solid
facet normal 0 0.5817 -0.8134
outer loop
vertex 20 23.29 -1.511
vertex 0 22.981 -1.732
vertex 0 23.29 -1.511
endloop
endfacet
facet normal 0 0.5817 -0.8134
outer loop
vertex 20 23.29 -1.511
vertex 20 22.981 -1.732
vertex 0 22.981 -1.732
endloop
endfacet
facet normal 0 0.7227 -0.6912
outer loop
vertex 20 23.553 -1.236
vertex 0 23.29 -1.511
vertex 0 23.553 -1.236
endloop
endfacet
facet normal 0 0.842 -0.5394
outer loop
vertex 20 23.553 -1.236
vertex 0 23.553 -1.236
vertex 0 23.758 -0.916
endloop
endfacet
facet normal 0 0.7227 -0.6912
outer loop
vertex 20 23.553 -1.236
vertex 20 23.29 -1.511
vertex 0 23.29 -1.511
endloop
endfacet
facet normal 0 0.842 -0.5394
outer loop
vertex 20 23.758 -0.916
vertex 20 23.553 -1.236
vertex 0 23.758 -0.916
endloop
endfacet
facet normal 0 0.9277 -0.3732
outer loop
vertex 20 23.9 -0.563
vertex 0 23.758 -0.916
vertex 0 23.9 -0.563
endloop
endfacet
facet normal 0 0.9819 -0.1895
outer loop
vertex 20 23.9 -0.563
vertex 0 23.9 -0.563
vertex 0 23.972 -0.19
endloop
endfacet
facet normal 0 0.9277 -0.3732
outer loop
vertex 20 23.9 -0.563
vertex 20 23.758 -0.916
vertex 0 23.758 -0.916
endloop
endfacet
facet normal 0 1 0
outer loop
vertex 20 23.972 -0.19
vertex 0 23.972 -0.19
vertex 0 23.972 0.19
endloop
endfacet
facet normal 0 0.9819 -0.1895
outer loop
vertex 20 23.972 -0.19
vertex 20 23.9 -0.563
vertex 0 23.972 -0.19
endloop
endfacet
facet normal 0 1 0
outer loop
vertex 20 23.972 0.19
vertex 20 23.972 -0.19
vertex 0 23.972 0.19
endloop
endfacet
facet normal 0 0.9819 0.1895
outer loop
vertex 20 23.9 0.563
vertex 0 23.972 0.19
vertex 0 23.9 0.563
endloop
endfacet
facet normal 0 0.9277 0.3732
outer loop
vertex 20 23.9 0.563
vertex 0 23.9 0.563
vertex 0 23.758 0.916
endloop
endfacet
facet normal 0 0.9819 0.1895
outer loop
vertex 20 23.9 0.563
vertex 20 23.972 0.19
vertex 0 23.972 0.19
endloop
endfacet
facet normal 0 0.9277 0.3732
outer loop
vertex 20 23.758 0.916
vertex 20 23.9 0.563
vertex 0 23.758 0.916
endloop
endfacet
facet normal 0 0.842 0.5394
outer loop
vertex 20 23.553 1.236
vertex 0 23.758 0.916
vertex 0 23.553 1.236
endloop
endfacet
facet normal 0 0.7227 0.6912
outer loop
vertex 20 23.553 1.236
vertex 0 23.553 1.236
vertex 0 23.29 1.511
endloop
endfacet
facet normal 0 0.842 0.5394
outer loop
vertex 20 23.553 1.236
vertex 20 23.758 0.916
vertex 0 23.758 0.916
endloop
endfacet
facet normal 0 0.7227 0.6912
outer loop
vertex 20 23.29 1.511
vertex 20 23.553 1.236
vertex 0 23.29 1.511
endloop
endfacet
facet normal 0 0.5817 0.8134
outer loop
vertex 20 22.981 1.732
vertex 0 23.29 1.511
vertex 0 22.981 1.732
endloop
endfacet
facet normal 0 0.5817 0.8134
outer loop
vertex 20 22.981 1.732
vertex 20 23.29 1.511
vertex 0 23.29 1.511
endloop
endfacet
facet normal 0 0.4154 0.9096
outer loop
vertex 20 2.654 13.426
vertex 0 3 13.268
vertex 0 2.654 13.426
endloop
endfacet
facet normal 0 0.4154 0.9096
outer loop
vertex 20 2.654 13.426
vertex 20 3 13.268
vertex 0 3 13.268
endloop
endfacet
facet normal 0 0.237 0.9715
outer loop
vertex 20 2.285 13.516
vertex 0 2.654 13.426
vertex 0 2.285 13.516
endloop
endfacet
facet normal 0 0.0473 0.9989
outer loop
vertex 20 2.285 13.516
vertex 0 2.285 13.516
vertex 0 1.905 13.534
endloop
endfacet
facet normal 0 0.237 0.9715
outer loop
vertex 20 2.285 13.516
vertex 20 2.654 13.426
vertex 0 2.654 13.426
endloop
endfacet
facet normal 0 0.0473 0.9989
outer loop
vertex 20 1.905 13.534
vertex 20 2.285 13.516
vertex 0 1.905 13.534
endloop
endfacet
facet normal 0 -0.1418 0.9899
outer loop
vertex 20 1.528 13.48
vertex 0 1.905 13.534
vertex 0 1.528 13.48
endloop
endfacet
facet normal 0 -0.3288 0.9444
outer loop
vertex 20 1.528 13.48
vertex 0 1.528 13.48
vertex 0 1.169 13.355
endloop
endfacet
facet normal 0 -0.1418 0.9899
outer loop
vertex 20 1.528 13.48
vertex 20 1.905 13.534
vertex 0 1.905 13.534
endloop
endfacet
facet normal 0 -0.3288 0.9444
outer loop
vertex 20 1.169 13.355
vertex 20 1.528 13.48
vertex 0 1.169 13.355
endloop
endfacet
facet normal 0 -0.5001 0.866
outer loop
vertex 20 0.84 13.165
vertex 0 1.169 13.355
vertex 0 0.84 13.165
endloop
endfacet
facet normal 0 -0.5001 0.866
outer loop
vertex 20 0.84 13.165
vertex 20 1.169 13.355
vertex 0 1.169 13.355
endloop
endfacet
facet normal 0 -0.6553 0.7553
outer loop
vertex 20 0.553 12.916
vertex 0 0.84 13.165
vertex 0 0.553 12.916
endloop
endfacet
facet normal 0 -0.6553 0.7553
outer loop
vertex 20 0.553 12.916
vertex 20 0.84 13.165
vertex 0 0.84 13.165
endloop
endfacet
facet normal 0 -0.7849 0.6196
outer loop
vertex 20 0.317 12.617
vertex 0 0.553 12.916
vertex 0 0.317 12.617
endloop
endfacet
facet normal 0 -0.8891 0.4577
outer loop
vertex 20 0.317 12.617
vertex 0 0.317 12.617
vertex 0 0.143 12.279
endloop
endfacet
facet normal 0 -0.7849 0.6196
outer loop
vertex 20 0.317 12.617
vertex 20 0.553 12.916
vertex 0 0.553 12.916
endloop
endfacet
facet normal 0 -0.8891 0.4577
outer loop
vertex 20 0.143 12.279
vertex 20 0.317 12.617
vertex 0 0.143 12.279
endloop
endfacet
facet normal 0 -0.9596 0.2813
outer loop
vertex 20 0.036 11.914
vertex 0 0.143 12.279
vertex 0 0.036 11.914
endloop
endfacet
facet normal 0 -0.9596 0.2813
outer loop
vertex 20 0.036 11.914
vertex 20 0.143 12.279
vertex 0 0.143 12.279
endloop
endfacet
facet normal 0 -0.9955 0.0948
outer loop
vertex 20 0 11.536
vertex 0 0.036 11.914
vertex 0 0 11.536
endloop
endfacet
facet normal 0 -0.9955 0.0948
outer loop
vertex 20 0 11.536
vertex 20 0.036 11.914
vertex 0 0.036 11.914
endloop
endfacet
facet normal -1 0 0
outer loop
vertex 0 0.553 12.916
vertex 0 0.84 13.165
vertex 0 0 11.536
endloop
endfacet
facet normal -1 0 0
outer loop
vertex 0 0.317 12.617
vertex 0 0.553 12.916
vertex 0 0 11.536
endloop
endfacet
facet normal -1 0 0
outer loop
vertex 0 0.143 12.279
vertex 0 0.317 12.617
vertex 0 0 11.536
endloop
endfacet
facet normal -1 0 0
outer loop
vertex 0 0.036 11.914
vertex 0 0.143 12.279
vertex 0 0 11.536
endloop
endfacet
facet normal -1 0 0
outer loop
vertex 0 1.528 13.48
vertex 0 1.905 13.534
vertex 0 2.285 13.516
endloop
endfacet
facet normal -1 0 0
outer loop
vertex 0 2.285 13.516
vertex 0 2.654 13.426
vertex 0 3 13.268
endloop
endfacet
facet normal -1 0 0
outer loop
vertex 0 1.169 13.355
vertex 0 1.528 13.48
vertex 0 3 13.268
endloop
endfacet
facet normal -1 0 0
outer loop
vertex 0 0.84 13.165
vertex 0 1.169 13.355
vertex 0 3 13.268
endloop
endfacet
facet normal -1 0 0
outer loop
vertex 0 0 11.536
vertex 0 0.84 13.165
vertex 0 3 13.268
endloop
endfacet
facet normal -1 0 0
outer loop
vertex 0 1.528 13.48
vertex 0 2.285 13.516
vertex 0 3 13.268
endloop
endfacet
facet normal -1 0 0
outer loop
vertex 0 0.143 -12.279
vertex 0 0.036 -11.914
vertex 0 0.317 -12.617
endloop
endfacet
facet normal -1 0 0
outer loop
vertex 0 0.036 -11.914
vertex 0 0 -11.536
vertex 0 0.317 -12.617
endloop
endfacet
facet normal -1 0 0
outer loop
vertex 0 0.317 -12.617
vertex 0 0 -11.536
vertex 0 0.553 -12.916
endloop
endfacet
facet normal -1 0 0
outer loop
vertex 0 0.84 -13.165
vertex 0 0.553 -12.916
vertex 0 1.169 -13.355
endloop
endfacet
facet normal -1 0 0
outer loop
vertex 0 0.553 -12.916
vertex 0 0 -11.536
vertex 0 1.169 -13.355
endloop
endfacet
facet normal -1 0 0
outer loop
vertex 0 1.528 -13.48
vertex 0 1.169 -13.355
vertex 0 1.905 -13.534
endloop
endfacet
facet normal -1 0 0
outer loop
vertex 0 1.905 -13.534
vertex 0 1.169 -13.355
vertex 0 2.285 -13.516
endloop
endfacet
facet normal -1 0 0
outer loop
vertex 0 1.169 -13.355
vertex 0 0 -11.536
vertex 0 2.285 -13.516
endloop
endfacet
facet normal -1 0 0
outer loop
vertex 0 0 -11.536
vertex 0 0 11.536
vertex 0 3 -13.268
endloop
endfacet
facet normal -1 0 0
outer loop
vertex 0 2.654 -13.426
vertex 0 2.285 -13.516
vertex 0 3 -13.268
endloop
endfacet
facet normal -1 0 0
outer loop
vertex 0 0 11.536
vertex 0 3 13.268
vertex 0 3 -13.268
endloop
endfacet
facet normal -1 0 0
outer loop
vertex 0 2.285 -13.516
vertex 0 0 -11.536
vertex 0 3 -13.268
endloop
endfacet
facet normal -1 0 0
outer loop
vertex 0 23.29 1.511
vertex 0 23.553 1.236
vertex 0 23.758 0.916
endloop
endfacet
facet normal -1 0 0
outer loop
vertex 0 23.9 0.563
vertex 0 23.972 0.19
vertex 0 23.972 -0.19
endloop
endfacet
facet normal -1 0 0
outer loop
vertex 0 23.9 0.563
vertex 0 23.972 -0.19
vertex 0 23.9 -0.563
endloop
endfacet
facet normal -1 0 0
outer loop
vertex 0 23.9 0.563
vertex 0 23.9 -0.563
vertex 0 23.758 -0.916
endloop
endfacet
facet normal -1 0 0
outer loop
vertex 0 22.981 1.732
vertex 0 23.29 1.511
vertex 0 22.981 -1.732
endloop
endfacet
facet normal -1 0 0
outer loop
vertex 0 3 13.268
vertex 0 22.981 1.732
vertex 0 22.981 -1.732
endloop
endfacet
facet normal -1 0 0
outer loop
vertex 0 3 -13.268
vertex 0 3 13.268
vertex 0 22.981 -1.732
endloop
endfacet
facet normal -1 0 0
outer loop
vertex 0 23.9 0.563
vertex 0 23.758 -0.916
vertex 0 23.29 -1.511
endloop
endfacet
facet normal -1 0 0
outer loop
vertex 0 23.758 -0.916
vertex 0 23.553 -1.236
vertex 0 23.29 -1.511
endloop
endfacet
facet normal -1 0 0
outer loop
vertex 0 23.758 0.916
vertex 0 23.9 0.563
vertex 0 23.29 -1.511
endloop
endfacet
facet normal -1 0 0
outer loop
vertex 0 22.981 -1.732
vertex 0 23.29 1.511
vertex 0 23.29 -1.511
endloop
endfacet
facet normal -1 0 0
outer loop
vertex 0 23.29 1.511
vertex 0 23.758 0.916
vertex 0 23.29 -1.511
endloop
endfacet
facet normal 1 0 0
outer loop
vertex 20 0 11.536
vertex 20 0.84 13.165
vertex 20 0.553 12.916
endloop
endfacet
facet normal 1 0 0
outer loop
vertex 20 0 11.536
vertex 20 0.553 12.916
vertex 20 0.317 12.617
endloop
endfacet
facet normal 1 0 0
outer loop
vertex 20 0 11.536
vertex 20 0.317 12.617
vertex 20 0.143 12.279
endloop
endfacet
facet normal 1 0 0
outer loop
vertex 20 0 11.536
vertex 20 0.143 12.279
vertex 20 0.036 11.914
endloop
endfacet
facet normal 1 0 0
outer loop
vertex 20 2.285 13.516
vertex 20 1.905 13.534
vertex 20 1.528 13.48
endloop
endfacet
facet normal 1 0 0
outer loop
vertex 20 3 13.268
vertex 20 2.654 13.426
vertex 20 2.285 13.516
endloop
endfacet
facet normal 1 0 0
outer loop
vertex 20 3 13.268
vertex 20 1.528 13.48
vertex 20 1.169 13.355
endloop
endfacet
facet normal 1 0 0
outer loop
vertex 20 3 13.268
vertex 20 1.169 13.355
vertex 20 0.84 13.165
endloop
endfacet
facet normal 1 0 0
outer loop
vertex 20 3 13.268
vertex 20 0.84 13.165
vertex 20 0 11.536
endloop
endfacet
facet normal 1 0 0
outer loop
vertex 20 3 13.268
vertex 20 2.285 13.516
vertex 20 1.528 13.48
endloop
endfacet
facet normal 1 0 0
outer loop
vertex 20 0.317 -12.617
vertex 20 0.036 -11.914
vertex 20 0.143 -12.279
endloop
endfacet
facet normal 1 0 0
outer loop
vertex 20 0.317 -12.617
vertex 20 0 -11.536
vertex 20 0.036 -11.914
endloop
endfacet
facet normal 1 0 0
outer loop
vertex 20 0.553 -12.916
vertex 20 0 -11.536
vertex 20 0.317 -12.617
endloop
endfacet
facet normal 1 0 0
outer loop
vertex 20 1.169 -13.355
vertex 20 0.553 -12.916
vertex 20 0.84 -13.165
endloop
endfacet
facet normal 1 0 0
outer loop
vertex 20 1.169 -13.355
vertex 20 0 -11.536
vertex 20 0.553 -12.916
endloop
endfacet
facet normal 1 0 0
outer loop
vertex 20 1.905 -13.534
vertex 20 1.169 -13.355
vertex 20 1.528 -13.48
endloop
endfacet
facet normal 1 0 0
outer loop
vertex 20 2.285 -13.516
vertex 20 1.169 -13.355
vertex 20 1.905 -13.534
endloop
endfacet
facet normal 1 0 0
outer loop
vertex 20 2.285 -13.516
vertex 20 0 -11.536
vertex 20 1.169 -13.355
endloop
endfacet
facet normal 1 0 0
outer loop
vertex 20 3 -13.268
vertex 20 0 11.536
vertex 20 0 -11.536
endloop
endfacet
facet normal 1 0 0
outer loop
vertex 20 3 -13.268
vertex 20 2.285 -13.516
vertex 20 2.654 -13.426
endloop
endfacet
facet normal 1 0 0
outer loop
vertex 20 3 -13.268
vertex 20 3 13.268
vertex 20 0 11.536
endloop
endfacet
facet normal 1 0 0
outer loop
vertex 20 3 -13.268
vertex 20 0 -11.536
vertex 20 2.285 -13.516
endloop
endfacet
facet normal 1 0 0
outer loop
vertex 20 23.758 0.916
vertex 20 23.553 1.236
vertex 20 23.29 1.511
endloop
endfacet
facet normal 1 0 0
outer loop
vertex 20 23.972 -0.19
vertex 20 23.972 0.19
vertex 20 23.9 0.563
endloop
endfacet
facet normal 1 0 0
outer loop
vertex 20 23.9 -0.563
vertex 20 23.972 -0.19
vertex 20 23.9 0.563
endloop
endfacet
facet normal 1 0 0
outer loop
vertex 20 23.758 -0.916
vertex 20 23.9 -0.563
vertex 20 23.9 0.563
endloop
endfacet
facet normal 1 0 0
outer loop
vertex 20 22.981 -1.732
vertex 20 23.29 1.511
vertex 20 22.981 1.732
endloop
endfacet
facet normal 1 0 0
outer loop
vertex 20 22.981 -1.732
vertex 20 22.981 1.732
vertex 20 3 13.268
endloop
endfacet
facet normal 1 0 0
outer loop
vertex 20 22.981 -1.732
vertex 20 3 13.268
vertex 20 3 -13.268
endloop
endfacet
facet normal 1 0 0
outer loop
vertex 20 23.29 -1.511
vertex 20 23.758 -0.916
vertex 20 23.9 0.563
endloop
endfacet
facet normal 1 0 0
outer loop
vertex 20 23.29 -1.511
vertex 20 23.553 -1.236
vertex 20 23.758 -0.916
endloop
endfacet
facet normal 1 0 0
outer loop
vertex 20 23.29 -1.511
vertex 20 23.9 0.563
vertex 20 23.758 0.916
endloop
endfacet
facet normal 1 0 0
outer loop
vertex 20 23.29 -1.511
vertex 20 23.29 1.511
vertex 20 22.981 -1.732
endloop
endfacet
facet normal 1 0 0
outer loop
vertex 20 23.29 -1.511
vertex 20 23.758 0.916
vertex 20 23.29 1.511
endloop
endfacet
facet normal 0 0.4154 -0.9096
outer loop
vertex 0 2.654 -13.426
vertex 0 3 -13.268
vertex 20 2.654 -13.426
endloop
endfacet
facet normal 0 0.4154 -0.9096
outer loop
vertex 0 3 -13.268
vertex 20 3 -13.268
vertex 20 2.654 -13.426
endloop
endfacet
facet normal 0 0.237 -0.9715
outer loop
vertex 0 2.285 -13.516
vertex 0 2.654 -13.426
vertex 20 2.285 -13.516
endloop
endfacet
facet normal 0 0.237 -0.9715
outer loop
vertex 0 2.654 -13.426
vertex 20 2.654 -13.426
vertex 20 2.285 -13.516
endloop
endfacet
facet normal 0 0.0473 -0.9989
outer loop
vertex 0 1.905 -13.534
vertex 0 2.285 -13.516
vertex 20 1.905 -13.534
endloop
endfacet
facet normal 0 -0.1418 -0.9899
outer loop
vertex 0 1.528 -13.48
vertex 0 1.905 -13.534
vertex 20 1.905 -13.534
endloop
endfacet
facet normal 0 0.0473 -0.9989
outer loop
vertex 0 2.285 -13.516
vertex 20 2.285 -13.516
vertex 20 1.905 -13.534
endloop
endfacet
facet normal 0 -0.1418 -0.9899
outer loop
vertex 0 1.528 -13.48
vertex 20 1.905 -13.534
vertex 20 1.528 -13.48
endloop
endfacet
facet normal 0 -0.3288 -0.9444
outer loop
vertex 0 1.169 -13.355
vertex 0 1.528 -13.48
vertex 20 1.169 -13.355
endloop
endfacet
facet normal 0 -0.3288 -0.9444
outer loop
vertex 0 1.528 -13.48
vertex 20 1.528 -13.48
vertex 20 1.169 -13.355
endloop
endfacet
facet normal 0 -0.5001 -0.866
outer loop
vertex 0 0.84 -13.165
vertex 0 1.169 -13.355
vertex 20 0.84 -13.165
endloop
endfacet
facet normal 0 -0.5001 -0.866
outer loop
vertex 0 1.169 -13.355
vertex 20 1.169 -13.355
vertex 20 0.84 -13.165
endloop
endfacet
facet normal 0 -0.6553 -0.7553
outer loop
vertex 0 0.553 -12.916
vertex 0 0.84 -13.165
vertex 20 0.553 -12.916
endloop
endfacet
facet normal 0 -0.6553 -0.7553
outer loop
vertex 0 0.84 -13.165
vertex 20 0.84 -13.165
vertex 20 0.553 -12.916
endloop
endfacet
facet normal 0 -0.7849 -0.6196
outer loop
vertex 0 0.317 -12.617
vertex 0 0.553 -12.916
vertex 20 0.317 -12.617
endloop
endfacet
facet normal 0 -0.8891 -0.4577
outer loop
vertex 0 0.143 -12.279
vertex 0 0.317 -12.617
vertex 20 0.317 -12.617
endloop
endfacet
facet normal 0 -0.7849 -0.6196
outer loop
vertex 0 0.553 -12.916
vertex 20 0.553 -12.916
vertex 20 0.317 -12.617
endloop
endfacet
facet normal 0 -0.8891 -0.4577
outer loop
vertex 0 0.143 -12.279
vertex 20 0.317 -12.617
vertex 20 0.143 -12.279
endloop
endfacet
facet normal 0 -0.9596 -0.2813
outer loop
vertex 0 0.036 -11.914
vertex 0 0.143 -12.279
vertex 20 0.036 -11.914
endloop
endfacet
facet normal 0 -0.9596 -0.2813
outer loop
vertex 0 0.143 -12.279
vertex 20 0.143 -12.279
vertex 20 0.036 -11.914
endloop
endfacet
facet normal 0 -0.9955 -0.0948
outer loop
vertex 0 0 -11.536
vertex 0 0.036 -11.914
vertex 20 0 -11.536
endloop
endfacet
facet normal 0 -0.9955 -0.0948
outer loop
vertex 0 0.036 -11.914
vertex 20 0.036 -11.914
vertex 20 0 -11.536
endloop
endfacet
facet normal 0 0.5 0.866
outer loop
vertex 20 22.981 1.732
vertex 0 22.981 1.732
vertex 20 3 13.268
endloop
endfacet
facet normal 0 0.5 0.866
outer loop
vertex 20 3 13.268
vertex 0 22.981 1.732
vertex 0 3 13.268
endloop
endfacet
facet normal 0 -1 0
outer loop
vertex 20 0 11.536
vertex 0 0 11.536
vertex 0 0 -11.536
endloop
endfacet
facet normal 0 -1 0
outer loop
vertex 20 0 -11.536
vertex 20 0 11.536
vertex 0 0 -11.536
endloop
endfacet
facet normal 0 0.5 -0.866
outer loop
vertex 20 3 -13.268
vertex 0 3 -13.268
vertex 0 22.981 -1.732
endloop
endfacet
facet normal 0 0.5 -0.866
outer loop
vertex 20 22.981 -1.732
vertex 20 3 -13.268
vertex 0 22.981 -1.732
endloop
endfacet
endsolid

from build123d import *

# Parameters (mm, degrees)
EXTRUDE_1_DEPTH = 20
FILLET_1_R      = 2


with BuildPart() as part:
    # 草图1 → 凸台-拉伸1 (new body)
    with BuildSketch(Plane(origin=(0, 0, 0), x_dir=(0, 0, -1), z_dir=(1, 0, 0))):
        Polygon((0, 25.980762114), (0, 0), (15, 0), align=None)
        Polygon((0, 25.980762114), (-15, 0), (0, 0), align=None)
    extrude(amount=EXTRUDE_1_DEPTH)

    # 圆角1
    fillet_1_edges = [part.edges().sort_by_distance(p)[0] for p in [
        (10, 0, -15),
        (10, 0, 15),
        (10, 25.980762114, 0),
    ]]
    fillet(fillet_1_edges, radius=FILLET_1_R)


solid = part.part
